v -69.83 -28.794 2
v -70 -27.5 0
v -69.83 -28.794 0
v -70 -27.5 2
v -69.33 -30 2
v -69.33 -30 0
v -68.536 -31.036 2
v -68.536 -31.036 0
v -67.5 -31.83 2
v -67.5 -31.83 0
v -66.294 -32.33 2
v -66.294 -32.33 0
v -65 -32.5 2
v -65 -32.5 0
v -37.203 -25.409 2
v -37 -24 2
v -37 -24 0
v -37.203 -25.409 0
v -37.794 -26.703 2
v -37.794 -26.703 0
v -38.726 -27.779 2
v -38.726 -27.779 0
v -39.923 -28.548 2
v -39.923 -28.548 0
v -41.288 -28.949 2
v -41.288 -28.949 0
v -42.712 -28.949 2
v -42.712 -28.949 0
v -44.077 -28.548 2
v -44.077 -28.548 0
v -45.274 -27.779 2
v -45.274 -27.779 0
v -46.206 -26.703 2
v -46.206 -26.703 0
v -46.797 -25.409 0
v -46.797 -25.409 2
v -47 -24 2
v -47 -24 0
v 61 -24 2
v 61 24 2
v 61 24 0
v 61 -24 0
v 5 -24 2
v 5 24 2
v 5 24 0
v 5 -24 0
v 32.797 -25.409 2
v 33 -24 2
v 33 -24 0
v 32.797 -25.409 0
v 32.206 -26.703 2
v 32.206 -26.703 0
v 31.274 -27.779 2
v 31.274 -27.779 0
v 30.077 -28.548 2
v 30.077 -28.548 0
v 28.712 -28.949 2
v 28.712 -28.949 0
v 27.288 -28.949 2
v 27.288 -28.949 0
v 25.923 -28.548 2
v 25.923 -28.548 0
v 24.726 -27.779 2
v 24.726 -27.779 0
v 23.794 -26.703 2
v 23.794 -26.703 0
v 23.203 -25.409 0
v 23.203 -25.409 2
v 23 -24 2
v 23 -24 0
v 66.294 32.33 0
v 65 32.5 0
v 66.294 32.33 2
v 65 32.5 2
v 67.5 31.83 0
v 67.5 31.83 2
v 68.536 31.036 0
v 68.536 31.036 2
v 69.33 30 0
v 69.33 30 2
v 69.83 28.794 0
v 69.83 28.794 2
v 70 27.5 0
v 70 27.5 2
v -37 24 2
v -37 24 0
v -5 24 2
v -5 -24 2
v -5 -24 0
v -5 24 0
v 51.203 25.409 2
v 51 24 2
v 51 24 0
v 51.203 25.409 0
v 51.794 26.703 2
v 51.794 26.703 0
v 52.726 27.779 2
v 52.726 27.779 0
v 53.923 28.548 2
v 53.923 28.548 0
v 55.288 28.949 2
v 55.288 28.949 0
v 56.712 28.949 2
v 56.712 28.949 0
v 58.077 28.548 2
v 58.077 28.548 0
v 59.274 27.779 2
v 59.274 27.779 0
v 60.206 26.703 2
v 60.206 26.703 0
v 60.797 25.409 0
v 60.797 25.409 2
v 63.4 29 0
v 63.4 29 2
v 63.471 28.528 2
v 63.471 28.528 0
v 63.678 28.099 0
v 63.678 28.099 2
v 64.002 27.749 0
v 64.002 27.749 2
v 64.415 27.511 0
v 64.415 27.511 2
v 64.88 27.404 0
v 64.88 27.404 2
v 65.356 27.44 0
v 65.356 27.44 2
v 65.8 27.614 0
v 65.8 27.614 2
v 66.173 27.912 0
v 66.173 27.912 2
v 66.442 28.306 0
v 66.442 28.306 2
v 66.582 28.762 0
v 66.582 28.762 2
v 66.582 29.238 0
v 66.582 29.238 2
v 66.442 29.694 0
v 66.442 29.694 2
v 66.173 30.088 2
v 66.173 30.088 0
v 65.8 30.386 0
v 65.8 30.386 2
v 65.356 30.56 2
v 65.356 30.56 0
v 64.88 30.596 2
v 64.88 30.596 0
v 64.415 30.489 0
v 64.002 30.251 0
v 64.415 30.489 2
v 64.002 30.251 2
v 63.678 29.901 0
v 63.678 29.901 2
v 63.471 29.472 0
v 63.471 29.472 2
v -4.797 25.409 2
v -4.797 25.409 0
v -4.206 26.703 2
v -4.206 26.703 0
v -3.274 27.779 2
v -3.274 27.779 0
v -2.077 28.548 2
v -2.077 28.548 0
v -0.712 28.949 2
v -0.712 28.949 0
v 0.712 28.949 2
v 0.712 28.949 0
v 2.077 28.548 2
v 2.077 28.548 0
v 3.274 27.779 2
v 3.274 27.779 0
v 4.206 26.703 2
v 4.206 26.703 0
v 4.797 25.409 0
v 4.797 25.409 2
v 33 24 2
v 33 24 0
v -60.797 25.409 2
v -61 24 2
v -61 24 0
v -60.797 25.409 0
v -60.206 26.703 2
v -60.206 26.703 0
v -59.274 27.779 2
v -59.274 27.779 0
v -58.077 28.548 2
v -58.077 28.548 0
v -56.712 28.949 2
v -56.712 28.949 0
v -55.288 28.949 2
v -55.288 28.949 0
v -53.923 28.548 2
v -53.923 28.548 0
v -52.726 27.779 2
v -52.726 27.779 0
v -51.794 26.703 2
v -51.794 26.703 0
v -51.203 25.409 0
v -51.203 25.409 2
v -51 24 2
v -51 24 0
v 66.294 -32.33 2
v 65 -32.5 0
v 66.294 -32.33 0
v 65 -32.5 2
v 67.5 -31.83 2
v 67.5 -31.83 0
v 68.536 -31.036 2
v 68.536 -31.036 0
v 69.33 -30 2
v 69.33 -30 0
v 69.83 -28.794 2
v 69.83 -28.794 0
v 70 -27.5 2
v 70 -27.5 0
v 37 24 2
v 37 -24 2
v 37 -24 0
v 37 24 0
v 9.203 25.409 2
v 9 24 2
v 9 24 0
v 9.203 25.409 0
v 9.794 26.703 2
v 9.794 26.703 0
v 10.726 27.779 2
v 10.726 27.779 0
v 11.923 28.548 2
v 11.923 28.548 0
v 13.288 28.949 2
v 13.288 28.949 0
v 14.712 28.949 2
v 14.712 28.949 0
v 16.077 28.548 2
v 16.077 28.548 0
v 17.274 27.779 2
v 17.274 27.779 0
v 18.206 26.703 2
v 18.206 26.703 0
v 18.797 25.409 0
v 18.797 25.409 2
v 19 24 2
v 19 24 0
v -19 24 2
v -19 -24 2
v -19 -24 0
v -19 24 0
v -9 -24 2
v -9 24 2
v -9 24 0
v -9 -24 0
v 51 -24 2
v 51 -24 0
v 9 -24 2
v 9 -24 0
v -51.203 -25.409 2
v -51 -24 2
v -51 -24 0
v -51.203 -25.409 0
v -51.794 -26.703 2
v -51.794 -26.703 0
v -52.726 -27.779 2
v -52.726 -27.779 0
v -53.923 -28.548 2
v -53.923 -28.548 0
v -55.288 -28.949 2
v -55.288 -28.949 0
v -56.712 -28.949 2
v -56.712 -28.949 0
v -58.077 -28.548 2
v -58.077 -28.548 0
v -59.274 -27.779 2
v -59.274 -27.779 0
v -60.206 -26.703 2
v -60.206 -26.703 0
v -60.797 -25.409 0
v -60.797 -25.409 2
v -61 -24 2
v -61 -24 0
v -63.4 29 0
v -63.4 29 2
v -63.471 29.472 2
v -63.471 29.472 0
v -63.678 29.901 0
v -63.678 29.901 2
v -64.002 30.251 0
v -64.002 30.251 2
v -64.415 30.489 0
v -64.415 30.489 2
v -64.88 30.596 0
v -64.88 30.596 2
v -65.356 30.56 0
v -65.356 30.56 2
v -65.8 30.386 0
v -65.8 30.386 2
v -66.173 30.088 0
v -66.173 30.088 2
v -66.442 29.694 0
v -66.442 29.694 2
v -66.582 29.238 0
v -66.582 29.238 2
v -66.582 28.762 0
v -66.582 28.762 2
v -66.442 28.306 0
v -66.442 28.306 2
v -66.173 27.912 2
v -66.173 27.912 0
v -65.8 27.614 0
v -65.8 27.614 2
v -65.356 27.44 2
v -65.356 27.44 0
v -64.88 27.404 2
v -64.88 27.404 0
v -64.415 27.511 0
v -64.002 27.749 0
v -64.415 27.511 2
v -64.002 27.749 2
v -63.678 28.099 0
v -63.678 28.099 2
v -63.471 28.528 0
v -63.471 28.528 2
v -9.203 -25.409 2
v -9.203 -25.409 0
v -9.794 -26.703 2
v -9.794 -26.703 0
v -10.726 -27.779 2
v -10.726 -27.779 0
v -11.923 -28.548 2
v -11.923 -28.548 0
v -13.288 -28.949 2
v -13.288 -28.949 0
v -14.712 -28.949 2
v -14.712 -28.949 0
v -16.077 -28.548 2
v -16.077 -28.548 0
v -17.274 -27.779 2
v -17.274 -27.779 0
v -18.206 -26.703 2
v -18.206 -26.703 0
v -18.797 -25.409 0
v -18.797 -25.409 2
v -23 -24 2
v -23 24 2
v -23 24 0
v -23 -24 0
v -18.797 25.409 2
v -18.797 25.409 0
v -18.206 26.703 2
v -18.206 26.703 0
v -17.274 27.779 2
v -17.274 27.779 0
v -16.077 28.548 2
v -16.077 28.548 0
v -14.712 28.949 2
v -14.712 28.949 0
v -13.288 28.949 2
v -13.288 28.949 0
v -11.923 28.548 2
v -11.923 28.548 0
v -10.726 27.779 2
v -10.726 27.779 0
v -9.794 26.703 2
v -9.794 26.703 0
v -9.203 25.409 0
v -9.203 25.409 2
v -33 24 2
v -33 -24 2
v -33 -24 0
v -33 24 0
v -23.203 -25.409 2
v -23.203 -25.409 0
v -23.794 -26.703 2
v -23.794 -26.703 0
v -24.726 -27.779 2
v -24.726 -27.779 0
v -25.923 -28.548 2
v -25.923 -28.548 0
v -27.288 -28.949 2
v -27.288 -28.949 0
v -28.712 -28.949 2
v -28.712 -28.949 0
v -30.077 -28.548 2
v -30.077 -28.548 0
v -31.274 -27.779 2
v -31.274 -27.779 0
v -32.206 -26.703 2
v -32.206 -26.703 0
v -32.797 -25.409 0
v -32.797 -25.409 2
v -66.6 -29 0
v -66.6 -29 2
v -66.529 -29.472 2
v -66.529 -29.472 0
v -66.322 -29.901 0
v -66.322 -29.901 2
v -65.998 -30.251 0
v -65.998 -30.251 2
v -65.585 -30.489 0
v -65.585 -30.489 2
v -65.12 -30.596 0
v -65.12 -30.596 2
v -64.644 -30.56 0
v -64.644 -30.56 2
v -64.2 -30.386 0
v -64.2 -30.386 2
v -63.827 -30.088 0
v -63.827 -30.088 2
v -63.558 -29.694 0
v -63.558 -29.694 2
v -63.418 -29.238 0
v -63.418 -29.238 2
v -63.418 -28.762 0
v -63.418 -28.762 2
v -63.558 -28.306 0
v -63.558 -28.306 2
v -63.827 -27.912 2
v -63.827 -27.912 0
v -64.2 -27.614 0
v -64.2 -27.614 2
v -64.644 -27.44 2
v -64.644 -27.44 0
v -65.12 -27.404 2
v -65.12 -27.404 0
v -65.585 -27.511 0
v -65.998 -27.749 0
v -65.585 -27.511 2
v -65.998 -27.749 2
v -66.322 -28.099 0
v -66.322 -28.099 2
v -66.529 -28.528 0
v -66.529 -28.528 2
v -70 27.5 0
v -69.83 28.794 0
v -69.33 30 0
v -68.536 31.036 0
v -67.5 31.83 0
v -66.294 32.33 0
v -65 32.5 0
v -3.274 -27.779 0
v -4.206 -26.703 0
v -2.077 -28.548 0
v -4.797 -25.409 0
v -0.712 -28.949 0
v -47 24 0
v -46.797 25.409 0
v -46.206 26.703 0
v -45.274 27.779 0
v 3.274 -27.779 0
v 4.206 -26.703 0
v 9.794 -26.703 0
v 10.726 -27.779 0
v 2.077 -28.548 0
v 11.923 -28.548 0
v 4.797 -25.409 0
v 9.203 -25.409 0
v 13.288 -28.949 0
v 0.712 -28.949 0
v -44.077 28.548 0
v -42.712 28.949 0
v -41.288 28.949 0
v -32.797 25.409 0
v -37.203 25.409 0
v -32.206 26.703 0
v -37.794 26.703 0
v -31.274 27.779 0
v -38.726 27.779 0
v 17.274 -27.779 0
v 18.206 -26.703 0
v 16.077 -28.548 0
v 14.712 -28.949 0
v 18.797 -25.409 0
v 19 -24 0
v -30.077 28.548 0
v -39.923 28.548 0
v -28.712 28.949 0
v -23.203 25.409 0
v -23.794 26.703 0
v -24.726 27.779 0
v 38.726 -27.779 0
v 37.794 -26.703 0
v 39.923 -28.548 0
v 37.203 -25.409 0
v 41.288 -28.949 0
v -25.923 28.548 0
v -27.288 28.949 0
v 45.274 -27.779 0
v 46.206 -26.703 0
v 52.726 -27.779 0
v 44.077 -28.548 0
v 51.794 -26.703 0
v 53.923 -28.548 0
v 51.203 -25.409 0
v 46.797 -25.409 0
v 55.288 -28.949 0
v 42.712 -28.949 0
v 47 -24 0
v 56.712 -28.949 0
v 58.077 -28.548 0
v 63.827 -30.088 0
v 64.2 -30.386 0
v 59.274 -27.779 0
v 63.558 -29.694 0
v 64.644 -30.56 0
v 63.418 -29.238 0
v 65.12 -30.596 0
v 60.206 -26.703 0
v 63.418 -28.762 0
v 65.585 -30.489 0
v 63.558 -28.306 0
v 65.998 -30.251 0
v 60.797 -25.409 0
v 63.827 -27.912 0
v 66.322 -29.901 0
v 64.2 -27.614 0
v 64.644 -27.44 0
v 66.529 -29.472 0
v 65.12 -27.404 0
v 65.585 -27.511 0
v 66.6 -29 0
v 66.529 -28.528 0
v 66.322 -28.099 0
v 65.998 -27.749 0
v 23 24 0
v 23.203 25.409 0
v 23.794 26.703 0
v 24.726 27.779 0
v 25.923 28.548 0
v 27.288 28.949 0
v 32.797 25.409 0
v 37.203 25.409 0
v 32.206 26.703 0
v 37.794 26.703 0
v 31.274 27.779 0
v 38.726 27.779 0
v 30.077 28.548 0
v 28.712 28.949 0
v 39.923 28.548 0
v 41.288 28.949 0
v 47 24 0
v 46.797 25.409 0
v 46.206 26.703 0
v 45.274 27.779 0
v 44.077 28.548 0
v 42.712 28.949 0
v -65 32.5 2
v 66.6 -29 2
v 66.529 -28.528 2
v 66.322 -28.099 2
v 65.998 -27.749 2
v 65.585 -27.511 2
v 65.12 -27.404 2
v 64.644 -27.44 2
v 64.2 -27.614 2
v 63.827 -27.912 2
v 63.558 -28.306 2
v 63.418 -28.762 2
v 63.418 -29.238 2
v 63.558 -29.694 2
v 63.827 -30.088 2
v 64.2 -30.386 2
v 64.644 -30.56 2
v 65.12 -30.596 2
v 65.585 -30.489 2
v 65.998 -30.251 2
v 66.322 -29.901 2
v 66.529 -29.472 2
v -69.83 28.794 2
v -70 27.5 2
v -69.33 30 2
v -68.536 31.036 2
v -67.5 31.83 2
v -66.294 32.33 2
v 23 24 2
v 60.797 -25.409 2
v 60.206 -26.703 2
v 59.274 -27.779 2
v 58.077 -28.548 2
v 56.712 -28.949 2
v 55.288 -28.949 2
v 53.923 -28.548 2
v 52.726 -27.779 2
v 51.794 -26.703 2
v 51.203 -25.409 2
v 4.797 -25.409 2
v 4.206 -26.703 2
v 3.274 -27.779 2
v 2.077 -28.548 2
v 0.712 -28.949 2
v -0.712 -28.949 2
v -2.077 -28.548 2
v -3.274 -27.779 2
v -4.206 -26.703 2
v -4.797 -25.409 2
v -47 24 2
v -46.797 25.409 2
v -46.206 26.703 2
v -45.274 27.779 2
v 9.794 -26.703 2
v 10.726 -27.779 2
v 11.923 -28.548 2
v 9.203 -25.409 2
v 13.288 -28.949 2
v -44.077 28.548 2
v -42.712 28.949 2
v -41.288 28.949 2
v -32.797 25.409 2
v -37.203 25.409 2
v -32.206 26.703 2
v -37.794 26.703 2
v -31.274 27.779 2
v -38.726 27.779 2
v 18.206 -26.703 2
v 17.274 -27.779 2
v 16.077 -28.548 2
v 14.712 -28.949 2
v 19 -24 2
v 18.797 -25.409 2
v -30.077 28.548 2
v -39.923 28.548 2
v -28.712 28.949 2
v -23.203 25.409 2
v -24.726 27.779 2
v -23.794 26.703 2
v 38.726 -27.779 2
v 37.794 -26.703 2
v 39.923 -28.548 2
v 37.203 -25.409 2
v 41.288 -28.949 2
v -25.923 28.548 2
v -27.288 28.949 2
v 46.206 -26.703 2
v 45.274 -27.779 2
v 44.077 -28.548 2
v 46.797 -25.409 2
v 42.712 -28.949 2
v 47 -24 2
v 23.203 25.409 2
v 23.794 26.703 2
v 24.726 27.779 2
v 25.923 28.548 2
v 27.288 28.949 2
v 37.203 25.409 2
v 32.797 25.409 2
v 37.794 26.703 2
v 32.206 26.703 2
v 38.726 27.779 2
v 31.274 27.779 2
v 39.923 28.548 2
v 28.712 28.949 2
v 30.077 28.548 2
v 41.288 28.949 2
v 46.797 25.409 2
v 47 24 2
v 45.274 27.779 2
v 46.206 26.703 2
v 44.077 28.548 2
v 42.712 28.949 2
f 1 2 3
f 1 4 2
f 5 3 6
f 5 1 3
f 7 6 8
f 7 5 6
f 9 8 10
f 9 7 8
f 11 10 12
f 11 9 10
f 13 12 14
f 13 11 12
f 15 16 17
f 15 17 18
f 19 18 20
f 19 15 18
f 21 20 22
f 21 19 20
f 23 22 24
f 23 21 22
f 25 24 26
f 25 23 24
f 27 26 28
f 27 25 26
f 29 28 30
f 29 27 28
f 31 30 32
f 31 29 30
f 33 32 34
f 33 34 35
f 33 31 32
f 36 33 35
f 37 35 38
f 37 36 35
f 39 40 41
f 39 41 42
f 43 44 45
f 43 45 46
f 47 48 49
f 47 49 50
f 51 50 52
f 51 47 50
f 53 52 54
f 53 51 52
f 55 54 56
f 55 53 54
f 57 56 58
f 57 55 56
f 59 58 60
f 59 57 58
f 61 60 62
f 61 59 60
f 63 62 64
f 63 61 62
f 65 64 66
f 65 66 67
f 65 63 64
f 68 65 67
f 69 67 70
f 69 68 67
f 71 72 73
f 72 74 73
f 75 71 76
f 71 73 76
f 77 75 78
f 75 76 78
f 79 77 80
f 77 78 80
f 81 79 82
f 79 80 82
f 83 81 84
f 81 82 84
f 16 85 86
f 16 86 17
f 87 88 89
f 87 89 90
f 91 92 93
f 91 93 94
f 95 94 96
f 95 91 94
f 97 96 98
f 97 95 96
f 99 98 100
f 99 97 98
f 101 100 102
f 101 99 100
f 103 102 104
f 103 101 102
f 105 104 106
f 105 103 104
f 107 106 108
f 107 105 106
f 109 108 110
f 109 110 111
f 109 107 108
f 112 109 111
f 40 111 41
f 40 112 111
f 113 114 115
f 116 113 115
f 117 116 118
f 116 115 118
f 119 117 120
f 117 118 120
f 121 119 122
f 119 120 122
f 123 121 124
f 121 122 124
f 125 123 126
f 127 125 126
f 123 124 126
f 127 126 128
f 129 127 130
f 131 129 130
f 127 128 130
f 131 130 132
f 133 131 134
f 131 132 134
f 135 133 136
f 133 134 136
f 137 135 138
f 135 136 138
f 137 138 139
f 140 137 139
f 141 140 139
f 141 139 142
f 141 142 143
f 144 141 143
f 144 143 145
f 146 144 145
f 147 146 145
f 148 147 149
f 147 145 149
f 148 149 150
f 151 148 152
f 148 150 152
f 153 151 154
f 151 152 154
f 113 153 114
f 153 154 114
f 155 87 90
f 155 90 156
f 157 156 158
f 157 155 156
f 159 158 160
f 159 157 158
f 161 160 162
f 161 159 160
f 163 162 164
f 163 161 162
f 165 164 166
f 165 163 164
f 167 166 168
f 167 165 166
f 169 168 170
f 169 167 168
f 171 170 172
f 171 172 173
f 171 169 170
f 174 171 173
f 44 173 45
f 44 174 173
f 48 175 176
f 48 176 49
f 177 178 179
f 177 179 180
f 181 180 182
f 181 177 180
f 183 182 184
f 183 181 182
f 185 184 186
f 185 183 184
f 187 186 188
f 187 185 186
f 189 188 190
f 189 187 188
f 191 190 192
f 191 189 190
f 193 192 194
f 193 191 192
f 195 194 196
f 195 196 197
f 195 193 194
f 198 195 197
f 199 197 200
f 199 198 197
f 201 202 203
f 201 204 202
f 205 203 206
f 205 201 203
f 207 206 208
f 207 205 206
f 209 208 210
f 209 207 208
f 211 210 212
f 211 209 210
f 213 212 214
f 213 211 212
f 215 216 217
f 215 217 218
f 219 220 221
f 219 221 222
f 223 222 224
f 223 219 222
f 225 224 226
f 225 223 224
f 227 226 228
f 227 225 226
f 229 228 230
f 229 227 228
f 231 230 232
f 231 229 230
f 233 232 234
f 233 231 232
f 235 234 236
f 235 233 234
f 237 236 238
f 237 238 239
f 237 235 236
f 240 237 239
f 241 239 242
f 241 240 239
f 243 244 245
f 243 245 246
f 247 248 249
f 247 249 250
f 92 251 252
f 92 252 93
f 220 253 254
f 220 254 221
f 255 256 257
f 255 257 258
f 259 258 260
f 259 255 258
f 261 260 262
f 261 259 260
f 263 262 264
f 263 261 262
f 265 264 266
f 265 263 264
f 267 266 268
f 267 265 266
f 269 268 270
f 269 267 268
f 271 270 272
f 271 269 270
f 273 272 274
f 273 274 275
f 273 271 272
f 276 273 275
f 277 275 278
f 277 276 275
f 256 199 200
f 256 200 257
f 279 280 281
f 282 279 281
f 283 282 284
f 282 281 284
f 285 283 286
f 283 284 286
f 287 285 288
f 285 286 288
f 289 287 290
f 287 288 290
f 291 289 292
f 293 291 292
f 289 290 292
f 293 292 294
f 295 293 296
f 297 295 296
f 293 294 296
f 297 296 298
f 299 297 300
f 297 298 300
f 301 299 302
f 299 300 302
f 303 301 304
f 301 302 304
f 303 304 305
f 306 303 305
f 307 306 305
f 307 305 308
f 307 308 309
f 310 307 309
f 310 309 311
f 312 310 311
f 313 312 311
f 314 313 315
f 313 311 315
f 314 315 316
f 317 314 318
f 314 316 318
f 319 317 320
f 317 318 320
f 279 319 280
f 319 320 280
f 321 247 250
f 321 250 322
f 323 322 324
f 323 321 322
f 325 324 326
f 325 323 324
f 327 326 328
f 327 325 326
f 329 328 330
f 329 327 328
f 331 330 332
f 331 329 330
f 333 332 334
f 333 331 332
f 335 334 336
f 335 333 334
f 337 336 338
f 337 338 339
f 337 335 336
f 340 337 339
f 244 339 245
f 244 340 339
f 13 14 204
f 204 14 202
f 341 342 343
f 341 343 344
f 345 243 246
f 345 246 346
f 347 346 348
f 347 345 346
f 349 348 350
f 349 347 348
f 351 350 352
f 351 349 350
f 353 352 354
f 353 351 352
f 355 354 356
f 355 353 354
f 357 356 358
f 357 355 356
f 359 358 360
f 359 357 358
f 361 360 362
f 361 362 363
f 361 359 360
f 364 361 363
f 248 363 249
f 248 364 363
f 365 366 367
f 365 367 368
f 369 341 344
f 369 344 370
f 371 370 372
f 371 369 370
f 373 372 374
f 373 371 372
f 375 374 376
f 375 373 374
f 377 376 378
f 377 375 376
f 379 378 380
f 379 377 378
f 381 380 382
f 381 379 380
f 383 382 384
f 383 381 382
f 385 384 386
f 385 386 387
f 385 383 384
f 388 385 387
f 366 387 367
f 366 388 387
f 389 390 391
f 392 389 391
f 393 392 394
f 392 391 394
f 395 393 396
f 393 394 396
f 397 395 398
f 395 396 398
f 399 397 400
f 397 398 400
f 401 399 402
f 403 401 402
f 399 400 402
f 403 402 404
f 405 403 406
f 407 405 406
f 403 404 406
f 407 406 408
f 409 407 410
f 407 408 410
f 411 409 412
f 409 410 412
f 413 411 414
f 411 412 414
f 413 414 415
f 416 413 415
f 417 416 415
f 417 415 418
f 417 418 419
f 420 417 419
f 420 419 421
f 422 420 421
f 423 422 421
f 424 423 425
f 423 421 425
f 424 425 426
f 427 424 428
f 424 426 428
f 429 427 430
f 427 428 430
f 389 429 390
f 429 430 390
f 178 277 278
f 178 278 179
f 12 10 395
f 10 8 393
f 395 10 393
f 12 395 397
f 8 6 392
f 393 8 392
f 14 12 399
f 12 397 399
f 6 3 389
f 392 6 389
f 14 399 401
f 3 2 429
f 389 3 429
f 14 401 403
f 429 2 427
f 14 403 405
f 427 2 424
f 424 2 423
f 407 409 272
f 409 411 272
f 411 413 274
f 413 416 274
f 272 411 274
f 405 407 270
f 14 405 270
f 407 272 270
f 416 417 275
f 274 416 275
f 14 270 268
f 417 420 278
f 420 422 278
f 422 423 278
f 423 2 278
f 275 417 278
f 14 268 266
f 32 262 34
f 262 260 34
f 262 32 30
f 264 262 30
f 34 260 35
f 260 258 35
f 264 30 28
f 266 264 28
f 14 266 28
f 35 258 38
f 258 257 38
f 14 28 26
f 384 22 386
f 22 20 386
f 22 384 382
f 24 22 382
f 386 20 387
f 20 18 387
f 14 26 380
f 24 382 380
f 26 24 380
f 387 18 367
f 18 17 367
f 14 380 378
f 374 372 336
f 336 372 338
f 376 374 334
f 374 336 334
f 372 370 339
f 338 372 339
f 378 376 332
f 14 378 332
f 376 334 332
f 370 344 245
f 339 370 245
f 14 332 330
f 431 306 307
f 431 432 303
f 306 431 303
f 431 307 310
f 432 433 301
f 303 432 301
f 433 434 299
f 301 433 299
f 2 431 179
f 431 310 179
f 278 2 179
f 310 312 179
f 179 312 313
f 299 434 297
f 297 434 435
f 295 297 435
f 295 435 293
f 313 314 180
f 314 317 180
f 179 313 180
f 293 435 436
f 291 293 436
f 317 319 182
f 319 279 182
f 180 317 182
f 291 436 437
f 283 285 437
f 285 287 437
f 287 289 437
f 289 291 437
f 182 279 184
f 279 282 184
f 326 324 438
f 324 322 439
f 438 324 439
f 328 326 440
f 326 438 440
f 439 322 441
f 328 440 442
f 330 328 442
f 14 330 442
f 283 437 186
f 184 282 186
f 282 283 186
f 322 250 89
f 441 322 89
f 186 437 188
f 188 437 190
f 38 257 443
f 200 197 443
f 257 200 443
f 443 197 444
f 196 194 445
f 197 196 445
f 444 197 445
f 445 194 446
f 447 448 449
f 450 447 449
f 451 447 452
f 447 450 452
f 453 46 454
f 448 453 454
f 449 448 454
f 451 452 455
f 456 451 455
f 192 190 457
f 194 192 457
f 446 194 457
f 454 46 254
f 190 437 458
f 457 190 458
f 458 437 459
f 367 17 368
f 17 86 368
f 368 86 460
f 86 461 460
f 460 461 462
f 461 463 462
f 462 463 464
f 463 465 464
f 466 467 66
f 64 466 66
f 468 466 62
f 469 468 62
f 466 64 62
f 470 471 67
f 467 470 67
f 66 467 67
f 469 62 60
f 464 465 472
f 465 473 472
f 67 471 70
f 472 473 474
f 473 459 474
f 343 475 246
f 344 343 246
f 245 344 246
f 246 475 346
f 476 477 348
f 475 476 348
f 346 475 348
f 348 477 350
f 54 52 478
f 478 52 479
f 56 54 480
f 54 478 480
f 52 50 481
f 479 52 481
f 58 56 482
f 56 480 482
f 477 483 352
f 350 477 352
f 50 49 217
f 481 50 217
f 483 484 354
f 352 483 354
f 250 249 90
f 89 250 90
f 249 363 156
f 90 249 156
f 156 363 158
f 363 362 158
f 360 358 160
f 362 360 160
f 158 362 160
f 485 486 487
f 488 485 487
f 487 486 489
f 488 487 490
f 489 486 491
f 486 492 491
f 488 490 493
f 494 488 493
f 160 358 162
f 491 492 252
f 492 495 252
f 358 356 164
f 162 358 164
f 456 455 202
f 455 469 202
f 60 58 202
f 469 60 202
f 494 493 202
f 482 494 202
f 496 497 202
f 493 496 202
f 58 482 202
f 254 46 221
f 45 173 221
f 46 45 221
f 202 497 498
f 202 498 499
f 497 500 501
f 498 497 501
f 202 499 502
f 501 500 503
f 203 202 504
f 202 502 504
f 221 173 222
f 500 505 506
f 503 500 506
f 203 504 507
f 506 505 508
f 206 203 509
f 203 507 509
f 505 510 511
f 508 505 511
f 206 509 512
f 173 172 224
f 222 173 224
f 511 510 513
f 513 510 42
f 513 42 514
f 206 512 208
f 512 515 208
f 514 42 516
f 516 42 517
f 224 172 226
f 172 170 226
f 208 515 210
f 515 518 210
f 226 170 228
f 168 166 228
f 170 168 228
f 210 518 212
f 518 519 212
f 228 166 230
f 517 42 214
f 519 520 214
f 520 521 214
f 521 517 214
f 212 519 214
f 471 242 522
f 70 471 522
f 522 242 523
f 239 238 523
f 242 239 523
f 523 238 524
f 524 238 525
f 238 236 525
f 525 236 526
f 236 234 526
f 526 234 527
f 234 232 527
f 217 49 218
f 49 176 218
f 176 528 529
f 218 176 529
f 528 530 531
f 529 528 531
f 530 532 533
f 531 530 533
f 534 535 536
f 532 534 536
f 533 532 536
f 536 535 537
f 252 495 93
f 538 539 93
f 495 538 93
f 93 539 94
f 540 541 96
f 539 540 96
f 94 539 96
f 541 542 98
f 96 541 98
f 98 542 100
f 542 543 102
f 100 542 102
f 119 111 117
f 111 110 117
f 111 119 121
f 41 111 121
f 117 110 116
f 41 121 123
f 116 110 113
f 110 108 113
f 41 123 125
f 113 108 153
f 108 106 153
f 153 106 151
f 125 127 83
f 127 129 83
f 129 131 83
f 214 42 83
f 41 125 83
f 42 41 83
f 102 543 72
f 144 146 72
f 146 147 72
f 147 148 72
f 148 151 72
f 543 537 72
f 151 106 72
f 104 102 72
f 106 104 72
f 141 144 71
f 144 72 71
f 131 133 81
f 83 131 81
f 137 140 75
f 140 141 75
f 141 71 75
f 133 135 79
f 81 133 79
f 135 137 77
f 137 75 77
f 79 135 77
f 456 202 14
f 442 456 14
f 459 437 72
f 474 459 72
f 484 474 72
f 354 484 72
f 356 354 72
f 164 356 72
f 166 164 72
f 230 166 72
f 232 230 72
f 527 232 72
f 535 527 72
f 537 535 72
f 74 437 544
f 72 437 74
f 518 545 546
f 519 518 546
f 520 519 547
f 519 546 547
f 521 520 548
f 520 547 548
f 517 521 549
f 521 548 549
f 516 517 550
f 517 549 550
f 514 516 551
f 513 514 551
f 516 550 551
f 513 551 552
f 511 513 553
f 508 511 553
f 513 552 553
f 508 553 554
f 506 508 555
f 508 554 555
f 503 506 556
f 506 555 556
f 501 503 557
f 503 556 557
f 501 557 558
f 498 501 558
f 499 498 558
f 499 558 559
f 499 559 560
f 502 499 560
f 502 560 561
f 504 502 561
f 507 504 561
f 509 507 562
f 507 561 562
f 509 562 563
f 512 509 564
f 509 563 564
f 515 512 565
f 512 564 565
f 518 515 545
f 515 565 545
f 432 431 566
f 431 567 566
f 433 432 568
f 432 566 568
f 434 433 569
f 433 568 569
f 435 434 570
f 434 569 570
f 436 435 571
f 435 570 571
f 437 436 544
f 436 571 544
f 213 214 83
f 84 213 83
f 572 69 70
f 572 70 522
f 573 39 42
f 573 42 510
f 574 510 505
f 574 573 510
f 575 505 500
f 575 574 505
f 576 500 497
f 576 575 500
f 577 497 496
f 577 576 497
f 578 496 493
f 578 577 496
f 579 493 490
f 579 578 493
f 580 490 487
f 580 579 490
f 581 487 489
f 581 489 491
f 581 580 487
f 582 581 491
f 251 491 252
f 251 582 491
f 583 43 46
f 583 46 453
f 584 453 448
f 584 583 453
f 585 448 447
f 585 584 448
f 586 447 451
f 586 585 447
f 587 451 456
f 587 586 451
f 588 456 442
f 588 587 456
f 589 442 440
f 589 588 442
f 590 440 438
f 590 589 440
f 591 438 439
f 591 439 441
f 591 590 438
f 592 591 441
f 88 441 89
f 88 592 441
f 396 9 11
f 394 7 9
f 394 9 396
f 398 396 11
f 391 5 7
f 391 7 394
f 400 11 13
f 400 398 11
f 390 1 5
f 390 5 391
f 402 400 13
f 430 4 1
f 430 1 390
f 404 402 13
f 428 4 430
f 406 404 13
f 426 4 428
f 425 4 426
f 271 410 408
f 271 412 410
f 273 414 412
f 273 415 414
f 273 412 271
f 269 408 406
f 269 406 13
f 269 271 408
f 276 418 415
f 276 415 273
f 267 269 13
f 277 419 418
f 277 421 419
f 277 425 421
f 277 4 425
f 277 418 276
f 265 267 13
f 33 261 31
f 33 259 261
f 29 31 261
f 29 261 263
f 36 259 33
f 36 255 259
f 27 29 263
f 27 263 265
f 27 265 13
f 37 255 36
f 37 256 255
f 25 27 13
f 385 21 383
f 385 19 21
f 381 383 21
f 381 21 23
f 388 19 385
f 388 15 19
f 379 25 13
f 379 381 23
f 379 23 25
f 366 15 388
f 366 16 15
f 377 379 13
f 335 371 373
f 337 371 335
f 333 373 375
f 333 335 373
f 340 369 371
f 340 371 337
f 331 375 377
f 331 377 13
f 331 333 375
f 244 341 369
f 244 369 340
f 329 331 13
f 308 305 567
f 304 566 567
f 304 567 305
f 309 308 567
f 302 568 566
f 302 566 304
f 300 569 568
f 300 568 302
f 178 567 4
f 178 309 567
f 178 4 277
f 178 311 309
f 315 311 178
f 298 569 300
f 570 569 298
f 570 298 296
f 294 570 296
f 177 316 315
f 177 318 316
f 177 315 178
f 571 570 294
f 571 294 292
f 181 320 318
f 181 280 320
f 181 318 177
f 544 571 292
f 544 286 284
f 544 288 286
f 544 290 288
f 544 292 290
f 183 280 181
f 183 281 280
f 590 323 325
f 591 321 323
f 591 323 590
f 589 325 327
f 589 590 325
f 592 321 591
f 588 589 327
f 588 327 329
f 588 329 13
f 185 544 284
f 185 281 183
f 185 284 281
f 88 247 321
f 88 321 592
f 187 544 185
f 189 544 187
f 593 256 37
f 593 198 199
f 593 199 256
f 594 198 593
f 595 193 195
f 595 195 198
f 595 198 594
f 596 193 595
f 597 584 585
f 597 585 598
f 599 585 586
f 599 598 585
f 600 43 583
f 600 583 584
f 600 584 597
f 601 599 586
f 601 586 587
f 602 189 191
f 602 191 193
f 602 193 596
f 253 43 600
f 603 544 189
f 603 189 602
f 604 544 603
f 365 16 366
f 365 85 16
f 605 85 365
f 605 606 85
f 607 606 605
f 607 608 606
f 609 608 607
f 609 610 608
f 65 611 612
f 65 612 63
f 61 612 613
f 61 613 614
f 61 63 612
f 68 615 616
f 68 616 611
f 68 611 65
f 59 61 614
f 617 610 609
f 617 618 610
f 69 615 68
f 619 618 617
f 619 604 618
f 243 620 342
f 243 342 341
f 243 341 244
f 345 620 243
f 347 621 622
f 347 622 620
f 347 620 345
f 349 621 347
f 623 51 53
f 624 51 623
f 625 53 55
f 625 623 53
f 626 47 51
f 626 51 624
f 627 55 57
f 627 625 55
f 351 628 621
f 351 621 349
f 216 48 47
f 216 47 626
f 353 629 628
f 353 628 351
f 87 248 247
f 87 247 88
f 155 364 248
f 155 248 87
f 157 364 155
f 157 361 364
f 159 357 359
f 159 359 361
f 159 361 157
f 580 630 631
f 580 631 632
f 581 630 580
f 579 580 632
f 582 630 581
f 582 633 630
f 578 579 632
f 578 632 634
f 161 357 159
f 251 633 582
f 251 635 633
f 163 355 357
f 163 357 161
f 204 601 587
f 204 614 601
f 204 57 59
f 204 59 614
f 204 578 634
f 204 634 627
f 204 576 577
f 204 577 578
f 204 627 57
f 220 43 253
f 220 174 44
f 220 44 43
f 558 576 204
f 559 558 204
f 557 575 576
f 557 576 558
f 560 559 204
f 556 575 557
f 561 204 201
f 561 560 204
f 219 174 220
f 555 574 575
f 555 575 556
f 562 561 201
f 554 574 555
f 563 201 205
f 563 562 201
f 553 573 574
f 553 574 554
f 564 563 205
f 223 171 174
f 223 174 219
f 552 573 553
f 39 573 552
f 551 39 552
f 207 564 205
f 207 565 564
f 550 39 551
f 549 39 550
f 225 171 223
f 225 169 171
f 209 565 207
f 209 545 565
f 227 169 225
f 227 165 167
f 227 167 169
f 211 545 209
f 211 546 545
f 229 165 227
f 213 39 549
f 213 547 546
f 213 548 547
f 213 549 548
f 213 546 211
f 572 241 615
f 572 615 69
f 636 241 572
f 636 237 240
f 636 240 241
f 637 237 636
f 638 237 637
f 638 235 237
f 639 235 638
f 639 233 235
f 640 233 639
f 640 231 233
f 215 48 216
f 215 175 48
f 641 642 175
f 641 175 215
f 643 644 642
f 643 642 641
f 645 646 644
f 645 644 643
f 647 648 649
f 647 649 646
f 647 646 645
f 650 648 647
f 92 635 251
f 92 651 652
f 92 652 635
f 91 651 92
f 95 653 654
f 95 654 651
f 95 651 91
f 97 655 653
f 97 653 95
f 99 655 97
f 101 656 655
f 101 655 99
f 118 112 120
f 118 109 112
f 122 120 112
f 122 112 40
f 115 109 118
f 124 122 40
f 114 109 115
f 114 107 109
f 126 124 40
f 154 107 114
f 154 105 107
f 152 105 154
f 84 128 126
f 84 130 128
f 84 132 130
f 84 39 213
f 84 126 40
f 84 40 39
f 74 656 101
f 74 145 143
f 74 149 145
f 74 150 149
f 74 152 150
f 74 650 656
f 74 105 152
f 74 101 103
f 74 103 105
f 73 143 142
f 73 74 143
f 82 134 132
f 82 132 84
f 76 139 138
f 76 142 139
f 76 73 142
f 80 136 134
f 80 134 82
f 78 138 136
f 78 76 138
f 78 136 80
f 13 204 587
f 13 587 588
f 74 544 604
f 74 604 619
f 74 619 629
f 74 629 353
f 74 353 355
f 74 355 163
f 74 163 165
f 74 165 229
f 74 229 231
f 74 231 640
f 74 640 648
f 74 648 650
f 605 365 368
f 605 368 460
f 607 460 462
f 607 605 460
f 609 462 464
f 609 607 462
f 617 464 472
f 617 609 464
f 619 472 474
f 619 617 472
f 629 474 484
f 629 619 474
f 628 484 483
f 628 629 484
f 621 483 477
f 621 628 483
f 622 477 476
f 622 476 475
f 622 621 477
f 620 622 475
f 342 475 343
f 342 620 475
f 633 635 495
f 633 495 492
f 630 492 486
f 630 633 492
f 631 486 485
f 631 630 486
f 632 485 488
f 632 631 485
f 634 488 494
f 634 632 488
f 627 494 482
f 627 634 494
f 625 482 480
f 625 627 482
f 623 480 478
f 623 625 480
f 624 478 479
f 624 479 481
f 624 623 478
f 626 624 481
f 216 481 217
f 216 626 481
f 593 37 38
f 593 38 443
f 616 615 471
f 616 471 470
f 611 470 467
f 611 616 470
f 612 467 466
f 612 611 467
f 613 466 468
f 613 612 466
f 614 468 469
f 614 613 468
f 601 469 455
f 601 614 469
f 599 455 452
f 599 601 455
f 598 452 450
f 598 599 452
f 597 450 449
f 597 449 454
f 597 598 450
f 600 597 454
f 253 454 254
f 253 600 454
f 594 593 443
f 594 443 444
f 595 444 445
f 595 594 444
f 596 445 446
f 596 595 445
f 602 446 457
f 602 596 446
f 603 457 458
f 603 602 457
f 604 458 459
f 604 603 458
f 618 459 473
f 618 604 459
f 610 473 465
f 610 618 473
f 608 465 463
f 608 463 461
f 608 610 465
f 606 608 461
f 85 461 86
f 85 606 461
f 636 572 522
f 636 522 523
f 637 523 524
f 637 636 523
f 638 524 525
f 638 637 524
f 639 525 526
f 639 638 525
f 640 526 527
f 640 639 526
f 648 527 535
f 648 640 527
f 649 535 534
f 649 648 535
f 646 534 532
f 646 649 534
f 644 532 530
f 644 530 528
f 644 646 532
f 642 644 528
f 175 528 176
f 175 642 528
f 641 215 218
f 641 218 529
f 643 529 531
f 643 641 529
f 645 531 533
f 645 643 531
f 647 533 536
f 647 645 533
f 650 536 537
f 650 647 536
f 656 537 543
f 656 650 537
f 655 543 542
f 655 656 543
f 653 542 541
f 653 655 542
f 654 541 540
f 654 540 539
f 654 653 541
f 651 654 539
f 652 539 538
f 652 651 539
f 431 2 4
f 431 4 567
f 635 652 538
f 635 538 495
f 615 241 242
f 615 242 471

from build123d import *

# Parameters (mm, degrees)
SKETCH_1_W          = 140
SKETCH_1_H          = 65
EXTRUDE_1_DEPTH     = 2
SKETCH_2_R          = 1.6
CUT_EXTRUDE_1_DEPTH = 2
CUT_EXTRUDE_2_DEPTH = 2
FILLET_1_R          = 5


with BuildPart() as part:
    # 草图1 → 凸台-拉伸1 (new body)
    with BuildSketch(Plane.XY):
        Rectangle(SKETCH_1_W, SKETCH_1_H)
    extrude(amount=EXTRUDE_1_DEPTH)

    # 草图2 → 切除-拉伸1 (cut)
    with BuildSketch(Plane.XY.offset(2)):
        with Locations((-65, 29)):
            Circle(SKETCH_2_R)
        with Locations(Location((65, 29, 0), (0, 0, 180))):
            Circle(SKETCH_2_R)
        with Locations((65, -29)):
            Circle(SKETCH_2_R)
        with Locations(Location((-65, -29, 0), (0, 0, 180))):
            Circle(SKETCH_2_R)
    extrude(amount=-CUT_EXTRUDE_1_DEPTH, mode=Mode.SUBTRACT)

    # 草图3 → 切除-拉伸2 (cut)
    with BuildSketch(Plane.XY.offset(2)):
        with BuildLine():
            Line((-51, 24), (-51, -24))
            ThreePointArc((-51, -24), (-56, -29), (-61, -24))
            Line((-61, -24), (-61, 24))
            ThreePointArc((-61, 24), (-56, 29), (-51, 24))
        make_face()
        with BuildLine():
            Line((-37, 24), (-37, -24))
            ThreePointArc((-37, -24), (-42, -29), (-47, -24))
            Line((-47, -24), (-47, 24))
            ThreePointArc((-47, 24), (-42, 29), (-37, 24))
        make_face()
        with BuildLine():
            Line((-23, 24), (-23, -24))
            ThreePointArc((-23, -24), (-28, -29), (-33, -24))
            Line((-33, -24), (-33, 24))
            ThreePointArc((-33, 24), (-28, 29), (-23, 24))
        make_face()
        with BuildLine():
            Line((-9, 24), (-9, -24))
            ThreePointArc((-9, -24), (-14, -29), (-19, -24))
            Line((-19, -24), (-19, 24))
            ThreePointArc((-19, 24), (-14, 29), (-9, 24))
        make_face()
        with BuildLine():
            Line((5, 24), (5, -24))
            ThreePointArc((5, -24), (0, -29), (-5, -24))
            Line((-5, -24), (-5, 24))
            ThreePointArc((-5, 24), (0, 29), (5, 24))
        make_face()
        with BuildLine():
            Line((19, 24), (19, -24))
            ThreePointArc((19, -24), (14, -29), (9, -24))
            Line((9, -24), (9, 24))
            ThreePointArc((9, 24), (14, 29), (19, 24))
        make_face()
        with BuildLine():
            Line((33, 24), (33, -24))
            ThreePointArc((33, -24), (28, -29), (23, -24))
            Line((23, -24), (23, 24))
            ThreePointArc((23, 24), (28, 29), (33, 24))
        make_face()
        with BuildLine():
            Line((47, 24), (47, -24))
            ThreePointArc((47, -24), (42, -29), (37, -24))
            Line((37, -24), (37, 24))
            ThreePointArc((37, 24), (42, 29), (47, 24))
        make_face()
        with BuildLine():
            Line((61, 24), (61, -24))
            ThreePointArc((61, -24), (56, -29), (51, -24))
            Line((51, -24), (51, 24))
            ThreePointArc((51, 24), (56, 29), (61, 24))
        make_face()
    extrude(amount=-CUT_EXTRUDE_2_DEPTH, mode=Mode.SUBTRACT)

    # 圆角1
    fillet_1_edges = [part.edges().sort_by_distance(p)[0] for p in [
        (-70, 32.5, 1),
        (70, 32.5, 1),
        (70, -32.5, 1),
        (-70, -32.5, 1),
    ]]
    fillet(fillet_1_edges, radius=FILLET_1_R)


solid = part.part
